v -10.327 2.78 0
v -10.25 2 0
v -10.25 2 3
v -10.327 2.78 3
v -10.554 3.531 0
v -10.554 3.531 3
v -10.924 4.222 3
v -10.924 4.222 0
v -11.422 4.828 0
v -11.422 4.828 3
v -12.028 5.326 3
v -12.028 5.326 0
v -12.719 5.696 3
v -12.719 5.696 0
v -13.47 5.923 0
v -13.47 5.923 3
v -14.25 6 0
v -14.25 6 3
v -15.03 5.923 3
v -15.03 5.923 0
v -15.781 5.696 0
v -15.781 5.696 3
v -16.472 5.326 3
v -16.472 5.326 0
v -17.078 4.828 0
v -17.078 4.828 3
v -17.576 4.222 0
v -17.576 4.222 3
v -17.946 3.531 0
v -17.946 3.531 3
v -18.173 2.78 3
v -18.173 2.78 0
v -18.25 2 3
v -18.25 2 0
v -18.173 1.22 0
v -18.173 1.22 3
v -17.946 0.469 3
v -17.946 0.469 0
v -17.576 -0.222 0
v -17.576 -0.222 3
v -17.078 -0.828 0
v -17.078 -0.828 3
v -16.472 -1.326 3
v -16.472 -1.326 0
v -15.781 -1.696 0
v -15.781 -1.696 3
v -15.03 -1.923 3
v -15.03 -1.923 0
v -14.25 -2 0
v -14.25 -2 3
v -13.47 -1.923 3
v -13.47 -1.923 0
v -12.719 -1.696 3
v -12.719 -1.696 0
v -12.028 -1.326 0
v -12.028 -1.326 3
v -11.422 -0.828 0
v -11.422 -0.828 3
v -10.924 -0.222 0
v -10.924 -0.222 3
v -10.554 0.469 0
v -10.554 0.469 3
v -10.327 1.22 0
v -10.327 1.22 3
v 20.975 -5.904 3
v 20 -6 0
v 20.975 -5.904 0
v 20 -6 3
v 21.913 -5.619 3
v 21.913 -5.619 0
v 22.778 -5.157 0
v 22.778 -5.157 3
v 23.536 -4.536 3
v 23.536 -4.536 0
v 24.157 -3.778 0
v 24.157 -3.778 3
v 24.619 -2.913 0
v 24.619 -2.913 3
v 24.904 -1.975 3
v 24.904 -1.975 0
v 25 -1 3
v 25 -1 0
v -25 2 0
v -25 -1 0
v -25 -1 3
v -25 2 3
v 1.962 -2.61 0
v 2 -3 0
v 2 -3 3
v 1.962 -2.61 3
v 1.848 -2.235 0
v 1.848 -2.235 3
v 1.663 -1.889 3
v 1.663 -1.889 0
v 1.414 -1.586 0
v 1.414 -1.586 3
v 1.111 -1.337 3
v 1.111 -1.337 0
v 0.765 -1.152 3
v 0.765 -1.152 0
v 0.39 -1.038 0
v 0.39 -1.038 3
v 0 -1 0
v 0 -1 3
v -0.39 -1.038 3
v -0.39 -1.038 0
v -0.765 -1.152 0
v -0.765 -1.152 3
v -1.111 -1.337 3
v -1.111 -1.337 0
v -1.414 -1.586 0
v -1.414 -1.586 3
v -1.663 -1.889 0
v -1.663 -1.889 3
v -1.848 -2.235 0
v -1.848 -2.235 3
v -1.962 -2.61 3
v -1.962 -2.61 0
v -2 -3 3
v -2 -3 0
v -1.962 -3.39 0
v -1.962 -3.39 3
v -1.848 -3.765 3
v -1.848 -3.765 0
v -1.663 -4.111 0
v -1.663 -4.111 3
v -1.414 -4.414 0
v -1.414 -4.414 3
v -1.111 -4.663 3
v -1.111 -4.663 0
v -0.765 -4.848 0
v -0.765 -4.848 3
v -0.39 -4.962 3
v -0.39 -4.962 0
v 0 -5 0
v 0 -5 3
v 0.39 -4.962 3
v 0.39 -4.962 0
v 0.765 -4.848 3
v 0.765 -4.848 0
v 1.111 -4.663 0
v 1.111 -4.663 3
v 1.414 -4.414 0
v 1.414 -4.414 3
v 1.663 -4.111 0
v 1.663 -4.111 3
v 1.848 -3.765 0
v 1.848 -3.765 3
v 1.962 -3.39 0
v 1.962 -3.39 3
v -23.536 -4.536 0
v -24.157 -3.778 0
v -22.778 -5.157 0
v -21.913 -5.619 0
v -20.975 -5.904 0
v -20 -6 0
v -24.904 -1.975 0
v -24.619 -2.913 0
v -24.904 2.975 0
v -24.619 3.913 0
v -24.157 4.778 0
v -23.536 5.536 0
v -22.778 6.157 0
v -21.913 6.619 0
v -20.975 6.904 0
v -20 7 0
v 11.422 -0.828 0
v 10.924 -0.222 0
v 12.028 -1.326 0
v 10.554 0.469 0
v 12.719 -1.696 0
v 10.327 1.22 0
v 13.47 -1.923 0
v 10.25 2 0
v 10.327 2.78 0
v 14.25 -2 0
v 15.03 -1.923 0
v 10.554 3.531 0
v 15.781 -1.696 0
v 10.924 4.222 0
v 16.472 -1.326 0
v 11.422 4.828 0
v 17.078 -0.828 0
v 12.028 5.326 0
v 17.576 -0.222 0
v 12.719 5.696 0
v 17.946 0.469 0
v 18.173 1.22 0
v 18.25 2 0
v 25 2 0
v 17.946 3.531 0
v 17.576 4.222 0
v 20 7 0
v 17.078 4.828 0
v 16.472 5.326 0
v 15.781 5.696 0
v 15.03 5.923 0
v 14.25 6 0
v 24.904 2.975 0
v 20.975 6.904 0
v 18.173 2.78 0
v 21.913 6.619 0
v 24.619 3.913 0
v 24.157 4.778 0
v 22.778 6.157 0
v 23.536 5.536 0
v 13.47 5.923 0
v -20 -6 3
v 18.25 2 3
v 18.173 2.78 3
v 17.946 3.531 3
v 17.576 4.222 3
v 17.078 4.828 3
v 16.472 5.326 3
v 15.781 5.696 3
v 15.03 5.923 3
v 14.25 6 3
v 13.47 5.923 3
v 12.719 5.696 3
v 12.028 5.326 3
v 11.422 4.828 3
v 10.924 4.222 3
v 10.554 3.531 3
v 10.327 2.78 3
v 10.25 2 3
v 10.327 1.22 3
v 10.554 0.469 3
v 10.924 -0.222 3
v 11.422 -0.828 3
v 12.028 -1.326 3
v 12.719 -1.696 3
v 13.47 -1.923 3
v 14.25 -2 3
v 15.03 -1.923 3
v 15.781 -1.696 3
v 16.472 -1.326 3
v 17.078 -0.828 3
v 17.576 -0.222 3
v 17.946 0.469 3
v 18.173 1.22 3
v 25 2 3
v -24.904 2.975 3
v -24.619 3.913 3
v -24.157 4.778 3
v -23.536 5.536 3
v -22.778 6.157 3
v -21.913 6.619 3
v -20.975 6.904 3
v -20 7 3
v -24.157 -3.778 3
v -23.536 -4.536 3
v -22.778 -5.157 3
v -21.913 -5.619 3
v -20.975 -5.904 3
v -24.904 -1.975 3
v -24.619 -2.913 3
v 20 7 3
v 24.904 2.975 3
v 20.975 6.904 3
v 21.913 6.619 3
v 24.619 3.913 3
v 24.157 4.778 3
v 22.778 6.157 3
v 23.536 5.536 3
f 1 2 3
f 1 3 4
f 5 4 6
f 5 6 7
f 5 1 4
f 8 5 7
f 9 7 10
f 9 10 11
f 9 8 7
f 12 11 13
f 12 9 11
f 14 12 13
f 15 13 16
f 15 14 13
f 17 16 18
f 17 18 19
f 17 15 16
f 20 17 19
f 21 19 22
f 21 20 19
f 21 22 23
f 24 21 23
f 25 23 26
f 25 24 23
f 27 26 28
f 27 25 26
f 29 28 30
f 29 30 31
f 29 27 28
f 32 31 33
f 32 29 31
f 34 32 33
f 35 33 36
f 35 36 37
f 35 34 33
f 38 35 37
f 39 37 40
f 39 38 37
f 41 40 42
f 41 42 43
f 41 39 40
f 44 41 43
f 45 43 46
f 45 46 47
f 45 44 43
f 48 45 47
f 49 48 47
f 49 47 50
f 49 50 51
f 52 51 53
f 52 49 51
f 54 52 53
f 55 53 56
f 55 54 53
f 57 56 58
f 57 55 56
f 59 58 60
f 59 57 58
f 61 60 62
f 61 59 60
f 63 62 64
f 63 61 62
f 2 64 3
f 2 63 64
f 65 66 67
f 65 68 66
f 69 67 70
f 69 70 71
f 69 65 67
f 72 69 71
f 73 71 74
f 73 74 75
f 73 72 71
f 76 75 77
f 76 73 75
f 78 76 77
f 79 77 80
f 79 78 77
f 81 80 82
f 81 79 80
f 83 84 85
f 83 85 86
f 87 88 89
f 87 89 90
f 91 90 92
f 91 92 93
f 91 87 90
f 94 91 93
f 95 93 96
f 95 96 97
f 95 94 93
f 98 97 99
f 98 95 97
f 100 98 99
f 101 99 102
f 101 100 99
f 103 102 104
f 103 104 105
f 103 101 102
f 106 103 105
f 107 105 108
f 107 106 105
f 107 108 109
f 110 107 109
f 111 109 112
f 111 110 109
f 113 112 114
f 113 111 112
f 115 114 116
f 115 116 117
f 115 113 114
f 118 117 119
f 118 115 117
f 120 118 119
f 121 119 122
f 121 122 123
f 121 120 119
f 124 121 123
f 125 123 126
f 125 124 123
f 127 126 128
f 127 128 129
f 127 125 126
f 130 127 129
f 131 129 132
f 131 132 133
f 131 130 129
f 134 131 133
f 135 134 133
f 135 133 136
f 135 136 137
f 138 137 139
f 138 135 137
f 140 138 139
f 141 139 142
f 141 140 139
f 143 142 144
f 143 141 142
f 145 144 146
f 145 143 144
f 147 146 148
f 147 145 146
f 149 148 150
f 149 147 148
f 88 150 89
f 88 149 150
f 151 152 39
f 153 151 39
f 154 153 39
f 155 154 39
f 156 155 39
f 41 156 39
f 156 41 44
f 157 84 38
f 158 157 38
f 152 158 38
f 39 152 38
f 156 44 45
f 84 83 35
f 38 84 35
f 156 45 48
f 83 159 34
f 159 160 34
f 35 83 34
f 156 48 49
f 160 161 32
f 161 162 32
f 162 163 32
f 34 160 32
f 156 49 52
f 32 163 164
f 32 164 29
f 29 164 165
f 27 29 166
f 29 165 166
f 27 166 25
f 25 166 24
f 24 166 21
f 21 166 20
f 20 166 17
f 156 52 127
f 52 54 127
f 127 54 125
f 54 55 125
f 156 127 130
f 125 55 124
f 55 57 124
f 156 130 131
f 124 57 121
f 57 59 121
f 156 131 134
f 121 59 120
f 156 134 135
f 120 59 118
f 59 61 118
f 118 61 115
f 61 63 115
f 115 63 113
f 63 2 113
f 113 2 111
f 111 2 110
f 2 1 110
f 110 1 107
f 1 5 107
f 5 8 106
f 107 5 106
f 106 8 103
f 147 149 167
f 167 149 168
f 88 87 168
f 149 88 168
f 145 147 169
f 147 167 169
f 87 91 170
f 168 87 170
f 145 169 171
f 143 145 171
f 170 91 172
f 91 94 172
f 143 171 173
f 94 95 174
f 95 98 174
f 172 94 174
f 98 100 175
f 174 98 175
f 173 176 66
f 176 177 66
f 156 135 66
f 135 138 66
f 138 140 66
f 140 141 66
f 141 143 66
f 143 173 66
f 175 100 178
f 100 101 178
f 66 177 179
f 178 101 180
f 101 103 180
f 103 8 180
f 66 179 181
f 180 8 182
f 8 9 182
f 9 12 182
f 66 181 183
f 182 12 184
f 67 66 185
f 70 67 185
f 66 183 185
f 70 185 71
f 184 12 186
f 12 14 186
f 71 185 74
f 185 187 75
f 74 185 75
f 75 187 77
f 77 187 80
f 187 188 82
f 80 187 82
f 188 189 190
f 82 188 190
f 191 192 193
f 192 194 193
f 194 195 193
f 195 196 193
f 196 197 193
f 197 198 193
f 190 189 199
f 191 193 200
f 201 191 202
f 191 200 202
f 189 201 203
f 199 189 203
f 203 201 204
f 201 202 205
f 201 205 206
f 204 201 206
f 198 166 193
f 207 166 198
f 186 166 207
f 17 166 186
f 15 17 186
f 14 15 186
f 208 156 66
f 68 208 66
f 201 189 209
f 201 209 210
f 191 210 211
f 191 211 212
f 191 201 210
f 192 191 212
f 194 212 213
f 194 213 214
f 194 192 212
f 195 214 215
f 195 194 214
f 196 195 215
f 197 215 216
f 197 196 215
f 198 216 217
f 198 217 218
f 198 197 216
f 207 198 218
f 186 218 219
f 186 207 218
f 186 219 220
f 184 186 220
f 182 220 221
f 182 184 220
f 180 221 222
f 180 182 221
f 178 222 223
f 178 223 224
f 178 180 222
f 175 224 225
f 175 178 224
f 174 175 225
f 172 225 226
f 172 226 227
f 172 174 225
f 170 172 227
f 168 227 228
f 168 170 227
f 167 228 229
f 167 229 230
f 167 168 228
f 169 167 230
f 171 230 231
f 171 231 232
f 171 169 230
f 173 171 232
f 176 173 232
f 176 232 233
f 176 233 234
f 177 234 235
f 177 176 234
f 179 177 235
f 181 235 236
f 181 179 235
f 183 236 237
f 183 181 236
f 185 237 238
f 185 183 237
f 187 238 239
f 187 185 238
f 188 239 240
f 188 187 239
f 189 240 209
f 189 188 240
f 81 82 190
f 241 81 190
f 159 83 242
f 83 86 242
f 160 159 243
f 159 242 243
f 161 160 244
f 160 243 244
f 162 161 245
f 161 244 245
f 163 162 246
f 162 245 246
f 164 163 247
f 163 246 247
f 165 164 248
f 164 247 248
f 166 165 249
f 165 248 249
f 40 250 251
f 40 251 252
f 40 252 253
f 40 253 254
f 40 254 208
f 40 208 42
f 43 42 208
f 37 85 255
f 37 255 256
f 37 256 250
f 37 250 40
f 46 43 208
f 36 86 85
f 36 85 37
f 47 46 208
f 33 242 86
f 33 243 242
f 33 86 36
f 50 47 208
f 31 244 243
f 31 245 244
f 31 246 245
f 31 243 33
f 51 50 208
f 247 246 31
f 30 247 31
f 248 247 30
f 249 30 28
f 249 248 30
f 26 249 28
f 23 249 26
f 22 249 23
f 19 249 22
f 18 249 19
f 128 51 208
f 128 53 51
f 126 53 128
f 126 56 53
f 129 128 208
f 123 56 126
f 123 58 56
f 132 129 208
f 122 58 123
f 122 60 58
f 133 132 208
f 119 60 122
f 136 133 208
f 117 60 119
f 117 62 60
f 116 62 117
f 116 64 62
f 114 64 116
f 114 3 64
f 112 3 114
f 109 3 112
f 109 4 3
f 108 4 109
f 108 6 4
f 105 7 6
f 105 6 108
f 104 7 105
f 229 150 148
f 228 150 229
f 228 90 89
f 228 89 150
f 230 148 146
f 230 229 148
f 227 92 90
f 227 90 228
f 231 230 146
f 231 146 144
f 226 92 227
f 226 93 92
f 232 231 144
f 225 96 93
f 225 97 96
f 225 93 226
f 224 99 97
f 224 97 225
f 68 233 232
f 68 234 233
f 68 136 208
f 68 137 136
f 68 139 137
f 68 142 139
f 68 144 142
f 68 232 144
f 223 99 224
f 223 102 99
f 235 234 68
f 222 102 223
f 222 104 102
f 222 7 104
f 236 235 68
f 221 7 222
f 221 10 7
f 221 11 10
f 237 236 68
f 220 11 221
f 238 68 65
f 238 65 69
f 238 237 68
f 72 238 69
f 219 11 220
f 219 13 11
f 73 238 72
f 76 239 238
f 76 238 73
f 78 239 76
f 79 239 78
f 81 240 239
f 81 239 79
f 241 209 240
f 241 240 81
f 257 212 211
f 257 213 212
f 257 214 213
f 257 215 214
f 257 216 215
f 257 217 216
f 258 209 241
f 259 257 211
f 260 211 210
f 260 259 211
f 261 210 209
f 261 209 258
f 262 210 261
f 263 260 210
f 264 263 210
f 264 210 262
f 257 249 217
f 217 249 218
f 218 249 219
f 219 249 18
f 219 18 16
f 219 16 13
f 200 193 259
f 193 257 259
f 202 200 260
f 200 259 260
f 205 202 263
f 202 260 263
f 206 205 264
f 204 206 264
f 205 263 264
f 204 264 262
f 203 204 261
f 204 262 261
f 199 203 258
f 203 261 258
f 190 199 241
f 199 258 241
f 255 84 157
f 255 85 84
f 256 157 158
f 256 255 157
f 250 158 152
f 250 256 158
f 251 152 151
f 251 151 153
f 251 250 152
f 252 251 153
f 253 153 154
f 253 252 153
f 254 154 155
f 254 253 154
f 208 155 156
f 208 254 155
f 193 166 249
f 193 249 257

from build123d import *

# Parameters (mm, degrees)
F0_W     = 50
F0_H     = 13
F0_R     = 2
F0_R_2   = 4
F1_DEPTH = 3
F2_R     = 5


with BuildPart() as f1:
    # F0 (on Top) → F1 (new body)
    with BuildSketch(Plane.XY):
        with Locations((0, 0.5)):
            Rectangle(F0_W, F0_H)
        with Locations((0, -3)):
            Circle(F0_R, mode=Mode.SUBTRACT)
        with Locations((-14.25, 2)):
            Circle(F0_R_2, mode=Mode.SUBTRACT)
        with Locations((14.25, 2)):
            Circle(F0_R_2, mode=Mode.SUBTRACT)
    extrude(amount=F1_DEPTH)

    # F2
    f2_edges = [f1.edges().sort_by_distance(p)[0] for p in [
        (-25, 7, 1.5),
        (-25, -6, 1.5),
        (25, -6, 1.5),
        (25, 7, 1.5),
    ]]
    fillet(f2_edges, radius=F2_R)


solid = f1.part
